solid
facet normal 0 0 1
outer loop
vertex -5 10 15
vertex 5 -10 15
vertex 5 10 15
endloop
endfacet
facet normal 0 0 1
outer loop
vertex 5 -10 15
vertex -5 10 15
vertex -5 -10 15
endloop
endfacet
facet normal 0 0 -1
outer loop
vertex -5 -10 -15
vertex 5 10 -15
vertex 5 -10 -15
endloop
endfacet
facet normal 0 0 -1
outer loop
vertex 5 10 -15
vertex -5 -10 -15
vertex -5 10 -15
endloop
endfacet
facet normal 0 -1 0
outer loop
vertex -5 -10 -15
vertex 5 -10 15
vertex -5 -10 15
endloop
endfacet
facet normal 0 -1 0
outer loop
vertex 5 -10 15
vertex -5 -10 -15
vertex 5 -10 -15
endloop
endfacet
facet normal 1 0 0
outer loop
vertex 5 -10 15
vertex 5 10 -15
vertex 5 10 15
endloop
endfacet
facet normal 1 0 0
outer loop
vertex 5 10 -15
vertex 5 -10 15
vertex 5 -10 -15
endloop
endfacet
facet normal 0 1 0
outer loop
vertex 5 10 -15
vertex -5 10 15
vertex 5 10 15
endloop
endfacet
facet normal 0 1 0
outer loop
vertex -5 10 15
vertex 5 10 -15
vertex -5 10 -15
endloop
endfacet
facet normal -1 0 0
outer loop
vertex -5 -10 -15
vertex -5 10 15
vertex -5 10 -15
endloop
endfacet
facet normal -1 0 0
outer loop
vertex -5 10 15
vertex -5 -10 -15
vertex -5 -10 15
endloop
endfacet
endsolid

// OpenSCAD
$fn = 1000;  // Увеличиваем количество граней для округления
cube([10, 20, 30], center=true);
